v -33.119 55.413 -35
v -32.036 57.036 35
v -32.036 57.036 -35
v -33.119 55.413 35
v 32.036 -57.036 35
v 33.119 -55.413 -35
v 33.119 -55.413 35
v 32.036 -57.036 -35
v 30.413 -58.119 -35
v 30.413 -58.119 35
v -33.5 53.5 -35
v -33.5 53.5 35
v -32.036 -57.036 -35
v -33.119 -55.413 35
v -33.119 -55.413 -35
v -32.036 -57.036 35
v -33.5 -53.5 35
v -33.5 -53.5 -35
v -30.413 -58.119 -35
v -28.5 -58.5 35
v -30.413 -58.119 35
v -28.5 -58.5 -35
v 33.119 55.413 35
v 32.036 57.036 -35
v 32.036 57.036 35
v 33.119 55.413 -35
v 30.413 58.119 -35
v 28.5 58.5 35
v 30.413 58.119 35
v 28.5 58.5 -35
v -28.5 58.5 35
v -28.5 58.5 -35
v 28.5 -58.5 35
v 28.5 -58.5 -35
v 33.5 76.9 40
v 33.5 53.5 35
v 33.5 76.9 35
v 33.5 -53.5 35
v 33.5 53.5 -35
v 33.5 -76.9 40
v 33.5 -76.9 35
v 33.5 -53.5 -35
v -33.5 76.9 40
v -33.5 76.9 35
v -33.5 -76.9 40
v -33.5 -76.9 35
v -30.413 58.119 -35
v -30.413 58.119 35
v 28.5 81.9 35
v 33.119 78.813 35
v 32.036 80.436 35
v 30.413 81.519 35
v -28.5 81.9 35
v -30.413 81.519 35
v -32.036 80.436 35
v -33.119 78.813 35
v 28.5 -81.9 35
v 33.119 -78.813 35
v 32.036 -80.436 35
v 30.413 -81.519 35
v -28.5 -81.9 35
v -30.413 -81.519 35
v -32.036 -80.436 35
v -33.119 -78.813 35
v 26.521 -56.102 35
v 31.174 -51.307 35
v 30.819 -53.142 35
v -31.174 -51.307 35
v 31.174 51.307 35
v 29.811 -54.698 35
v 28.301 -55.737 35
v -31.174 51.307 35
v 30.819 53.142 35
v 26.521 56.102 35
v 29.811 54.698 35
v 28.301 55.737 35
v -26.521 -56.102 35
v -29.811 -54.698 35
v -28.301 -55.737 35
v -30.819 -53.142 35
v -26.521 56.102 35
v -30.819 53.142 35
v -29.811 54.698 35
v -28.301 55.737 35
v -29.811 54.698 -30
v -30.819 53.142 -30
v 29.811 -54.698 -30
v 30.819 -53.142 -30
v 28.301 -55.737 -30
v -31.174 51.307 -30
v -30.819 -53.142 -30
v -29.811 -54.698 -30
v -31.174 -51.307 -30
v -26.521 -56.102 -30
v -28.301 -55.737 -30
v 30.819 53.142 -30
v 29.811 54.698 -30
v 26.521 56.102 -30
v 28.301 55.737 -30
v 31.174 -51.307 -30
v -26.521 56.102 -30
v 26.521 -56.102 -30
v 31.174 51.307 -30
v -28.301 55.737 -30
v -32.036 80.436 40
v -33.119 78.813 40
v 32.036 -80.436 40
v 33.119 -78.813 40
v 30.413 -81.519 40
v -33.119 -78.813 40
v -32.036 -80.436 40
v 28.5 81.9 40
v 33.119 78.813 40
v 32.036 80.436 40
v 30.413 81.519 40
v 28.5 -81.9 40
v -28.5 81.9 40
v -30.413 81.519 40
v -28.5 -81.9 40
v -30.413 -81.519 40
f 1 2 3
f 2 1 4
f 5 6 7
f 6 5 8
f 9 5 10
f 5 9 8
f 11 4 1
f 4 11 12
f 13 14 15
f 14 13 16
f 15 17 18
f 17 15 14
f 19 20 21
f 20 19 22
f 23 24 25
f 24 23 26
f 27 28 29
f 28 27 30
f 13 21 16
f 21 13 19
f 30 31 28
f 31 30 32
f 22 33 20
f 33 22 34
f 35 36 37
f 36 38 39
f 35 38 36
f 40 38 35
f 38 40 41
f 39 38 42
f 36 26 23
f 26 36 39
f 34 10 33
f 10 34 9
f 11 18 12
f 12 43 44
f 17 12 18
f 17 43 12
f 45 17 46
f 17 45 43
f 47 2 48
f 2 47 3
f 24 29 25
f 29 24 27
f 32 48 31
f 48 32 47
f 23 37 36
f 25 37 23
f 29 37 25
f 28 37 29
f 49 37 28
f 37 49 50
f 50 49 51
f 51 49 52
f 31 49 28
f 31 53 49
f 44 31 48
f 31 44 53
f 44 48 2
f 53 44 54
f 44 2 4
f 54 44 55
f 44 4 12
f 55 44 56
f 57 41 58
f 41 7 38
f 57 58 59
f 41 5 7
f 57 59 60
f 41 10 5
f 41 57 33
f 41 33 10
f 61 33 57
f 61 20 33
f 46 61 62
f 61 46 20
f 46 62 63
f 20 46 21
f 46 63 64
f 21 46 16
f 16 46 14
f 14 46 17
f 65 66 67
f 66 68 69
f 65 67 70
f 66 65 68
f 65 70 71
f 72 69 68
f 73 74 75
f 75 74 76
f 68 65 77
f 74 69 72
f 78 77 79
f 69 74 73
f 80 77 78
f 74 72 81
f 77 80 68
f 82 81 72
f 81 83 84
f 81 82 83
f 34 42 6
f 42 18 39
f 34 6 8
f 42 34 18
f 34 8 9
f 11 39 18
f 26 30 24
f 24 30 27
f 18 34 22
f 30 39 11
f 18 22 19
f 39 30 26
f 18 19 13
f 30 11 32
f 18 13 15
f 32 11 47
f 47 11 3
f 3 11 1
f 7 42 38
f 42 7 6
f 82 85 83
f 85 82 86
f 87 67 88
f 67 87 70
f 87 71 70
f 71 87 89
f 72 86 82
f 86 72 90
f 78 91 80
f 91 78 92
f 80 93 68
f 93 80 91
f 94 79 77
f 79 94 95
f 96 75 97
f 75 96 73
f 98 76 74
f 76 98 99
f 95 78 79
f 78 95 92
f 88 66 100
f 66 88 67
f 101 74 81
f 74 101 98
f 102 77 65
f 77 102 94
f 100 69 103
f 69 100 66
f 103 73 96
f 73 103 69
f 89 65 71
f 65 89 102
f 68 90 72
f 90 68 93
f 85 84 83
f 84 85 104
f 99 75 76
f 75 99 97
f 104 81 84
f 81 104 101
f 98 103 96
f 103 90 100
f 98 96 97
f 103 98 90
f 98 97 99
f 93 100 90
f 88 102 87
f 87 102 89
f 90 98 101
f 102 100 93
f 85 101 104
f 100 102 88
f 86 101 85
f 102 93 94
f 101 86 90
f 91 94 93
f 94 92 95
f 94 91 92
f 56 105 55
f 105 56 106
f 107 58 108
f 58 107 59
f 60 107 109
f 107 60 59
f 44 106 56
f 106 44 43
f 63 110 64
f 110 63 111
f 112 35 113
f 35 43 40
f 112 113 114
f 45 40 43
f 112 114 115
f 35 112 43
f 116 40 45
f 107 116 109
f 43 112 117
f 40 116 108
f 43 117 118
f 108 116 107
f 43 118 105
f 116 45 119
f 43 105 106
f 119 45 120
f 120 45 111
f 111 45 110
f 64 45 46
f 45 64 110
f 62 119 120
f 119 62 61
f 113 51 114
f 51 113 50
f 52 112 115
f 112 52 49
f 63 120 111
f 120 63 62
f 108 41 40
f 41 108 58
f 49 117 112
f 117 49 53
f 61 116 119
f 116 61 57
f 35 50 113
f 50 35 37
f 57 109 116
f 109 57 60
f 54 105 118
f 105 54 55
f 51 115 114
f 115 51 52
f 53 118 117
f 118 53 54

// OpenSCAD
// definitions
w = 65+2;
l = 115+2;
d = 70;

fillet = 5;
thick = 5; // thickness of the wall

// set up modules

module outer(width, length, depth, fillet) {
    linear_extrude(depth, center = true)
    offset(r = +fillet) offset(delta = -fillet) {
        square([width, length], center = true);
    }
}

//outer(w, l, d, fillet = fillet);

module r_box(width, length, depth, thickness, fillet) {
	difference() {
        // outer
        outer(width = width, length = length, depth = depth, fillet = fillet);
        // inner
        translate([0, 0, thickness])
        scale([width/(width+thickness), length/(length+thickness), 1]) // [x,y,z]
        outer(width = width, length = length, depth = depth, fillet = fillet);
    }
}

r_box(width = w, length = l, depth = d, thickness = thick, fillet = fillet);

module lid(width, length, depth, thickness, fillet) {
    translate([0,0,depth/2+thickness/2])
    linear_extrude(thickness, center = true)
    offset(r = +fillet) offset(delta = -fillet) {
        square([width, length*1.4], center = true);
    }
}

lid(w, l, d, thick, fillet = fillet);
